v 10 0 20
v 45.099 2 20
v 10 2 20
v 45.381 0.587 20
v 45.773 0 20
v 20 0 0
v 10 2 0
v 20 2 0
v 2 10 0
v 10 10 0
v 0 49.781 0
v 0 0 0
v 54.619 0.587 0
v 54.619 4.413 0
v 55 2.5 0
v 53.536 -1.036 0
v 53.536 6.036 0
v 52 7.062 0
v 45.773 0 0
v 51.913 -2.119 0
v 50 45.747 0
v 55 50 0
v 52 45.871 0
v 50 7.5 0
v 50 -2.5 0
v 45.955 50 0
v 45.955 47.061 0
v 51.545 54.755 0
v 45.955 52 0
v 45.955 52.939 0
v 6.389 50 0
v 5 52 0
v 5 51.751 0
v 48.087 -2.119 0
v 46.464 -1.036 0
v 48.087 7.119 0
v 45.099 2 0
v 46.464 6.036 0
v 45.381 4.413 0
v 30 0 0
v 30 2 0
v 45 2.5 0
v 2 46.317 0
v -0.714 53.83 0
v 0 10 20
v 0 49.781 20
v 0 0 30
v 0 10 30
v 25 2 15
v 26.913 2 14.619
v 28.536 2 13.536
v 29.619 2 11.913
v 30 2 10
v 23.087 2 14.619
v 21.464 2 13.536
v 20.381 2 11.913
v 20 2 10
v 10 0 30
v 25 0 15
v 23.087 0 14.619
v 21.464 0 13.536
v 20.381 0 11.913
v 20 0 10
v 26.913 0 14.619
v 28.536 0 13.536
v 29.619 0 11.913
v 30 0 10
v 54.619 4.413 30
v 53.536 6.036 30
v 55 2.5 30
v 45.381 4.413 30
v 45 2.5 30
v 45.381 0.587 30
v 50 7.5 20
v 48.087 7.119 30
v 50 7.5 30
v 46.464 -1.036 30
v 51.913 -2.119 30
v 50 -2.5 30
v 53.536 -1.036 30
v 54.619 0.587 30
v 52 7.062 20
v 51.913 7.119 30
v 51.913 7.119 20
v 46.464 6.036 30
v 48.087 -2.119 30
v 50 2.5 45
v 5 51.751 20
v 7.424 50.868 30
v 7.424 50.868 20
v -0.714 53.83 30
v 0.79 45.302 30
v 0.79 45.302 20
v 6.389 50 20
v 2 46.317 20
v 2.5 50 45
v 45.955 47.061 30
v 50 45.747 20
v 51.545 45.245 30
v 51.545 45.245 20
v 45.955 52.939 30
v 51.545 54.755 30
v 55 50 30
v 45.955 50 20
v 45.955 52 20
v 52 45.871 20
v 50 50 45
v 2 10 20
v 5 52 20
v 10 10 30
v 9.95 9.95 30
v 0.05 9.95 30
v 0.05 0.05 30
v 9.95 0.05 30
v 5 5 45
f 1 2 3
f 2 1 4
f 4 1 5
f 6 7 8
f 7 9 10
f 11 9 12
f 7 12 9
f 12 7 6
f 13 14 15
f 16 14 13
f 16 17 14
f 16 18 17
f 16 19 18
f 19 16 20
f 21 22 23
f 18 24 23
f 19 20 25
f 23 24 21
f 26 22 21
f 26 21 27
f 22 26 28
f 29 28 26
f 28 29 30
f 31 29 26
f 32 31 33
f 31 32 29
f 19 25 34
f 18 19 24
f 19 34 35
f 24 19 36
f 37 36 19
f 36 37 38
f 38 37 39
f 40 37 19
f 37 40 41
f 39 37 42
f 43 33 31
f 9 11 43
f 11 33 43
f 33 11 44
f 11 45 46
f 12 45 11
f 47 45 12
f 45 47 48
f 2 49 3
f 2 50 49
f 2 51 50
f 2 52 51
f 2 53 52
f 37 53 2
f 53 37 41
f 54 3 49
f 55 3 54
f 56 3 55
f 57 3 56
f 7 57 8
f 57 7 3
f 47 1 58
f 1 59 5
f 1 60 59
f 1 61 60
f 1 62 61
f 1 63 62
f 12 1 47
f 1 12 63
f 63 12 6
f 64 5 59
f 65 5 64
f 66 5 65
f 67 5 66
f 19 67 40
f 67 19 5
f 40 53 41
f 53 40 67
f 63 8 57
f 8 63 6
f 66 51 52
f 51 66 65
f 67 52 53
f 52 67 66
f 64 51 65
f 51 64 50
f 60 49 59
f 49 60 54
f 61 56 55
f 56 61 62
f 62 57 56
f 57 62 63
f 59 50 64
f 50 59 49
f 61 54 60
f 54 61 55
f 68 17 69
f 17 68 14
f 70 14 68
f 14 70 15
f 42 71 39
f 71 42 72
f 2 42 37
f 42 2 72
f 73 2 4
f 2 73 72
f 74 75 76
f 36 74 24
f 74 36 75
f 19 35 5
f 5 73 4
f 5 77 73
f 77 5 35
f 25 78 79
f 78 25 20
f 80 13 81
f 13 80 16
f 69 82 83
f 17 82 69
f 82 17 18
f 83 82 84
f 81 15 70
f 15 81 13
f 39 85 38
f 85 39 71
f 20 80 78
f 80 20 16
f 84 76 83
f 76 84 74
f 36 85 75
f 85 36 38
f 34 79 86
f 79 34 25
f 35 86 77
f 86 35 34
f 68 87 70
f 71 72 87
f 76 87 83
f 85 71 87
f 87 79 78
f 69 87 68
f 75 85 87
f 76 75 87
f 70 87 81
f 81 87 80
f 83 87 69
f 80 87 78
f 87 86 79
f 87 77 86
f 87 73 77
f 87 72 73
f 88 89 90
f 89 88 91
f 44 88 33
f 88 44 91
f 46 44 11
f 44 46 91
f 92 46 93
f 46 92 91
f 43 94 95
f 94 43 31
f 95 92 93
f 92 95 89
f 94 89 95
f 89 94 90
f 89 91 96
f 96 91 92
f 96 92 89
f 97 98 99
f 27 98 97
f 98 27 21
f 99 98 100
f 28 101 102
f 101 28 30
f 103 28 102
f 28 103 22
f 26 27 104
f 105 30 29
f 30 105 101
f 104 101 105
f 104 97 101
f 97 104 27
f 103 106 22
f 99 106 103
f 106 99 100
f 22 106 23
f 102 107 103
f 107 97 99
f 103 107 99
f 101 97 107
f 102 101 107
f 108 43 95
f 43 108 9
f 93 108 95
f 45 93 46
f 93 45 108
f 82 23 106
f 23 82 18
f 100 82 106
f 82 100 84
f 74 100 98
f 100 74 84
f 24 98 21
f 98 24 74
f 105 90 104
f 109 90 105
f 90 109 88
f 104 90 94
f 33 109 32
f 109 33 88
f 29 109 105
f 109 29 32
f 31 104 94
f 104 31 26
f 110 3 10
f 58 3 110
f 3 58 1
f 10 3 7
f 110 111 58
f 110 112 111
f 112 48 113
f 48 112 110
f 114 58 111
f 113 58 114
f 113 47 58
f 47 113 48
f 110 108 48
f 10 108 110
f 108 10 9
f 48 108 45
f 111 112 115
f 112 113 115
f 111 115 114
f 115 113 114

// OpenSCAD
/* [Parameters] */

circularTowerHeight = 30;
squareTowerHeight = 30;
triangleTowerHeight = 30;
pentagonTowerHeight = 30;

/* [Hidden] */
//walls
cube([2,50,20]);

translate([50,5,0])
	cube([2,47,20]);

translate([5,50,0])
	cube([47,2,20]);
////////////////////////////////////////////////////////////
//Gate
difference()
{
cube([50,2,20]);
translate([20,0,0])
	cube([10,2,10]);

translate([25,2.5,10])
	rotate([90,0,0])
		cylinder(r1=5,r2=5,h=4,$fn=0);
}
////////////////////////////////////////////////////////////
//Circular Tower
translate([50,2.5,0])
{
	cylinder(r1=5,r2=5,h=circularTowerHeight,$fn=0);
	translate([0,0,circularTowerHeight])
		cylinder(r1=5,r2=0,h=15,$fn=0);	
}

////////////////////////////////////////////////////////////
//triangle tower
translate([2.5,50,0])
{
	rotate([0,0,10])
	cylinder(r1=5,r2=5,triangleTowerHeight,$fn=3);	
	
	rotate([0,0,10])
	translate([0,0,triangleTowerHeight])
	cylinder(r1=5,r2=0,h=15,$fn=3);
}
////////////////////////////////////////////////////////////
//Pentagon tower
translate([50,50,0])
{
	cylinder(r1=5,r2=5,pentagonTowerHeight,$fn=5);
	translate([0,0,pentagonTowerHeight])
		cylinder(r1=5,r2=0,h=15,$fn=5);
}
////////////////////////////////////////////////////////////
//square tower
{
cube([10,10,squareTowerHeight]);

translate([5,5,squareTowerHeight])
	rotate([0,0,45])	
		cylinder(r1=7,r2=0,h=15,$fn=4);
}
